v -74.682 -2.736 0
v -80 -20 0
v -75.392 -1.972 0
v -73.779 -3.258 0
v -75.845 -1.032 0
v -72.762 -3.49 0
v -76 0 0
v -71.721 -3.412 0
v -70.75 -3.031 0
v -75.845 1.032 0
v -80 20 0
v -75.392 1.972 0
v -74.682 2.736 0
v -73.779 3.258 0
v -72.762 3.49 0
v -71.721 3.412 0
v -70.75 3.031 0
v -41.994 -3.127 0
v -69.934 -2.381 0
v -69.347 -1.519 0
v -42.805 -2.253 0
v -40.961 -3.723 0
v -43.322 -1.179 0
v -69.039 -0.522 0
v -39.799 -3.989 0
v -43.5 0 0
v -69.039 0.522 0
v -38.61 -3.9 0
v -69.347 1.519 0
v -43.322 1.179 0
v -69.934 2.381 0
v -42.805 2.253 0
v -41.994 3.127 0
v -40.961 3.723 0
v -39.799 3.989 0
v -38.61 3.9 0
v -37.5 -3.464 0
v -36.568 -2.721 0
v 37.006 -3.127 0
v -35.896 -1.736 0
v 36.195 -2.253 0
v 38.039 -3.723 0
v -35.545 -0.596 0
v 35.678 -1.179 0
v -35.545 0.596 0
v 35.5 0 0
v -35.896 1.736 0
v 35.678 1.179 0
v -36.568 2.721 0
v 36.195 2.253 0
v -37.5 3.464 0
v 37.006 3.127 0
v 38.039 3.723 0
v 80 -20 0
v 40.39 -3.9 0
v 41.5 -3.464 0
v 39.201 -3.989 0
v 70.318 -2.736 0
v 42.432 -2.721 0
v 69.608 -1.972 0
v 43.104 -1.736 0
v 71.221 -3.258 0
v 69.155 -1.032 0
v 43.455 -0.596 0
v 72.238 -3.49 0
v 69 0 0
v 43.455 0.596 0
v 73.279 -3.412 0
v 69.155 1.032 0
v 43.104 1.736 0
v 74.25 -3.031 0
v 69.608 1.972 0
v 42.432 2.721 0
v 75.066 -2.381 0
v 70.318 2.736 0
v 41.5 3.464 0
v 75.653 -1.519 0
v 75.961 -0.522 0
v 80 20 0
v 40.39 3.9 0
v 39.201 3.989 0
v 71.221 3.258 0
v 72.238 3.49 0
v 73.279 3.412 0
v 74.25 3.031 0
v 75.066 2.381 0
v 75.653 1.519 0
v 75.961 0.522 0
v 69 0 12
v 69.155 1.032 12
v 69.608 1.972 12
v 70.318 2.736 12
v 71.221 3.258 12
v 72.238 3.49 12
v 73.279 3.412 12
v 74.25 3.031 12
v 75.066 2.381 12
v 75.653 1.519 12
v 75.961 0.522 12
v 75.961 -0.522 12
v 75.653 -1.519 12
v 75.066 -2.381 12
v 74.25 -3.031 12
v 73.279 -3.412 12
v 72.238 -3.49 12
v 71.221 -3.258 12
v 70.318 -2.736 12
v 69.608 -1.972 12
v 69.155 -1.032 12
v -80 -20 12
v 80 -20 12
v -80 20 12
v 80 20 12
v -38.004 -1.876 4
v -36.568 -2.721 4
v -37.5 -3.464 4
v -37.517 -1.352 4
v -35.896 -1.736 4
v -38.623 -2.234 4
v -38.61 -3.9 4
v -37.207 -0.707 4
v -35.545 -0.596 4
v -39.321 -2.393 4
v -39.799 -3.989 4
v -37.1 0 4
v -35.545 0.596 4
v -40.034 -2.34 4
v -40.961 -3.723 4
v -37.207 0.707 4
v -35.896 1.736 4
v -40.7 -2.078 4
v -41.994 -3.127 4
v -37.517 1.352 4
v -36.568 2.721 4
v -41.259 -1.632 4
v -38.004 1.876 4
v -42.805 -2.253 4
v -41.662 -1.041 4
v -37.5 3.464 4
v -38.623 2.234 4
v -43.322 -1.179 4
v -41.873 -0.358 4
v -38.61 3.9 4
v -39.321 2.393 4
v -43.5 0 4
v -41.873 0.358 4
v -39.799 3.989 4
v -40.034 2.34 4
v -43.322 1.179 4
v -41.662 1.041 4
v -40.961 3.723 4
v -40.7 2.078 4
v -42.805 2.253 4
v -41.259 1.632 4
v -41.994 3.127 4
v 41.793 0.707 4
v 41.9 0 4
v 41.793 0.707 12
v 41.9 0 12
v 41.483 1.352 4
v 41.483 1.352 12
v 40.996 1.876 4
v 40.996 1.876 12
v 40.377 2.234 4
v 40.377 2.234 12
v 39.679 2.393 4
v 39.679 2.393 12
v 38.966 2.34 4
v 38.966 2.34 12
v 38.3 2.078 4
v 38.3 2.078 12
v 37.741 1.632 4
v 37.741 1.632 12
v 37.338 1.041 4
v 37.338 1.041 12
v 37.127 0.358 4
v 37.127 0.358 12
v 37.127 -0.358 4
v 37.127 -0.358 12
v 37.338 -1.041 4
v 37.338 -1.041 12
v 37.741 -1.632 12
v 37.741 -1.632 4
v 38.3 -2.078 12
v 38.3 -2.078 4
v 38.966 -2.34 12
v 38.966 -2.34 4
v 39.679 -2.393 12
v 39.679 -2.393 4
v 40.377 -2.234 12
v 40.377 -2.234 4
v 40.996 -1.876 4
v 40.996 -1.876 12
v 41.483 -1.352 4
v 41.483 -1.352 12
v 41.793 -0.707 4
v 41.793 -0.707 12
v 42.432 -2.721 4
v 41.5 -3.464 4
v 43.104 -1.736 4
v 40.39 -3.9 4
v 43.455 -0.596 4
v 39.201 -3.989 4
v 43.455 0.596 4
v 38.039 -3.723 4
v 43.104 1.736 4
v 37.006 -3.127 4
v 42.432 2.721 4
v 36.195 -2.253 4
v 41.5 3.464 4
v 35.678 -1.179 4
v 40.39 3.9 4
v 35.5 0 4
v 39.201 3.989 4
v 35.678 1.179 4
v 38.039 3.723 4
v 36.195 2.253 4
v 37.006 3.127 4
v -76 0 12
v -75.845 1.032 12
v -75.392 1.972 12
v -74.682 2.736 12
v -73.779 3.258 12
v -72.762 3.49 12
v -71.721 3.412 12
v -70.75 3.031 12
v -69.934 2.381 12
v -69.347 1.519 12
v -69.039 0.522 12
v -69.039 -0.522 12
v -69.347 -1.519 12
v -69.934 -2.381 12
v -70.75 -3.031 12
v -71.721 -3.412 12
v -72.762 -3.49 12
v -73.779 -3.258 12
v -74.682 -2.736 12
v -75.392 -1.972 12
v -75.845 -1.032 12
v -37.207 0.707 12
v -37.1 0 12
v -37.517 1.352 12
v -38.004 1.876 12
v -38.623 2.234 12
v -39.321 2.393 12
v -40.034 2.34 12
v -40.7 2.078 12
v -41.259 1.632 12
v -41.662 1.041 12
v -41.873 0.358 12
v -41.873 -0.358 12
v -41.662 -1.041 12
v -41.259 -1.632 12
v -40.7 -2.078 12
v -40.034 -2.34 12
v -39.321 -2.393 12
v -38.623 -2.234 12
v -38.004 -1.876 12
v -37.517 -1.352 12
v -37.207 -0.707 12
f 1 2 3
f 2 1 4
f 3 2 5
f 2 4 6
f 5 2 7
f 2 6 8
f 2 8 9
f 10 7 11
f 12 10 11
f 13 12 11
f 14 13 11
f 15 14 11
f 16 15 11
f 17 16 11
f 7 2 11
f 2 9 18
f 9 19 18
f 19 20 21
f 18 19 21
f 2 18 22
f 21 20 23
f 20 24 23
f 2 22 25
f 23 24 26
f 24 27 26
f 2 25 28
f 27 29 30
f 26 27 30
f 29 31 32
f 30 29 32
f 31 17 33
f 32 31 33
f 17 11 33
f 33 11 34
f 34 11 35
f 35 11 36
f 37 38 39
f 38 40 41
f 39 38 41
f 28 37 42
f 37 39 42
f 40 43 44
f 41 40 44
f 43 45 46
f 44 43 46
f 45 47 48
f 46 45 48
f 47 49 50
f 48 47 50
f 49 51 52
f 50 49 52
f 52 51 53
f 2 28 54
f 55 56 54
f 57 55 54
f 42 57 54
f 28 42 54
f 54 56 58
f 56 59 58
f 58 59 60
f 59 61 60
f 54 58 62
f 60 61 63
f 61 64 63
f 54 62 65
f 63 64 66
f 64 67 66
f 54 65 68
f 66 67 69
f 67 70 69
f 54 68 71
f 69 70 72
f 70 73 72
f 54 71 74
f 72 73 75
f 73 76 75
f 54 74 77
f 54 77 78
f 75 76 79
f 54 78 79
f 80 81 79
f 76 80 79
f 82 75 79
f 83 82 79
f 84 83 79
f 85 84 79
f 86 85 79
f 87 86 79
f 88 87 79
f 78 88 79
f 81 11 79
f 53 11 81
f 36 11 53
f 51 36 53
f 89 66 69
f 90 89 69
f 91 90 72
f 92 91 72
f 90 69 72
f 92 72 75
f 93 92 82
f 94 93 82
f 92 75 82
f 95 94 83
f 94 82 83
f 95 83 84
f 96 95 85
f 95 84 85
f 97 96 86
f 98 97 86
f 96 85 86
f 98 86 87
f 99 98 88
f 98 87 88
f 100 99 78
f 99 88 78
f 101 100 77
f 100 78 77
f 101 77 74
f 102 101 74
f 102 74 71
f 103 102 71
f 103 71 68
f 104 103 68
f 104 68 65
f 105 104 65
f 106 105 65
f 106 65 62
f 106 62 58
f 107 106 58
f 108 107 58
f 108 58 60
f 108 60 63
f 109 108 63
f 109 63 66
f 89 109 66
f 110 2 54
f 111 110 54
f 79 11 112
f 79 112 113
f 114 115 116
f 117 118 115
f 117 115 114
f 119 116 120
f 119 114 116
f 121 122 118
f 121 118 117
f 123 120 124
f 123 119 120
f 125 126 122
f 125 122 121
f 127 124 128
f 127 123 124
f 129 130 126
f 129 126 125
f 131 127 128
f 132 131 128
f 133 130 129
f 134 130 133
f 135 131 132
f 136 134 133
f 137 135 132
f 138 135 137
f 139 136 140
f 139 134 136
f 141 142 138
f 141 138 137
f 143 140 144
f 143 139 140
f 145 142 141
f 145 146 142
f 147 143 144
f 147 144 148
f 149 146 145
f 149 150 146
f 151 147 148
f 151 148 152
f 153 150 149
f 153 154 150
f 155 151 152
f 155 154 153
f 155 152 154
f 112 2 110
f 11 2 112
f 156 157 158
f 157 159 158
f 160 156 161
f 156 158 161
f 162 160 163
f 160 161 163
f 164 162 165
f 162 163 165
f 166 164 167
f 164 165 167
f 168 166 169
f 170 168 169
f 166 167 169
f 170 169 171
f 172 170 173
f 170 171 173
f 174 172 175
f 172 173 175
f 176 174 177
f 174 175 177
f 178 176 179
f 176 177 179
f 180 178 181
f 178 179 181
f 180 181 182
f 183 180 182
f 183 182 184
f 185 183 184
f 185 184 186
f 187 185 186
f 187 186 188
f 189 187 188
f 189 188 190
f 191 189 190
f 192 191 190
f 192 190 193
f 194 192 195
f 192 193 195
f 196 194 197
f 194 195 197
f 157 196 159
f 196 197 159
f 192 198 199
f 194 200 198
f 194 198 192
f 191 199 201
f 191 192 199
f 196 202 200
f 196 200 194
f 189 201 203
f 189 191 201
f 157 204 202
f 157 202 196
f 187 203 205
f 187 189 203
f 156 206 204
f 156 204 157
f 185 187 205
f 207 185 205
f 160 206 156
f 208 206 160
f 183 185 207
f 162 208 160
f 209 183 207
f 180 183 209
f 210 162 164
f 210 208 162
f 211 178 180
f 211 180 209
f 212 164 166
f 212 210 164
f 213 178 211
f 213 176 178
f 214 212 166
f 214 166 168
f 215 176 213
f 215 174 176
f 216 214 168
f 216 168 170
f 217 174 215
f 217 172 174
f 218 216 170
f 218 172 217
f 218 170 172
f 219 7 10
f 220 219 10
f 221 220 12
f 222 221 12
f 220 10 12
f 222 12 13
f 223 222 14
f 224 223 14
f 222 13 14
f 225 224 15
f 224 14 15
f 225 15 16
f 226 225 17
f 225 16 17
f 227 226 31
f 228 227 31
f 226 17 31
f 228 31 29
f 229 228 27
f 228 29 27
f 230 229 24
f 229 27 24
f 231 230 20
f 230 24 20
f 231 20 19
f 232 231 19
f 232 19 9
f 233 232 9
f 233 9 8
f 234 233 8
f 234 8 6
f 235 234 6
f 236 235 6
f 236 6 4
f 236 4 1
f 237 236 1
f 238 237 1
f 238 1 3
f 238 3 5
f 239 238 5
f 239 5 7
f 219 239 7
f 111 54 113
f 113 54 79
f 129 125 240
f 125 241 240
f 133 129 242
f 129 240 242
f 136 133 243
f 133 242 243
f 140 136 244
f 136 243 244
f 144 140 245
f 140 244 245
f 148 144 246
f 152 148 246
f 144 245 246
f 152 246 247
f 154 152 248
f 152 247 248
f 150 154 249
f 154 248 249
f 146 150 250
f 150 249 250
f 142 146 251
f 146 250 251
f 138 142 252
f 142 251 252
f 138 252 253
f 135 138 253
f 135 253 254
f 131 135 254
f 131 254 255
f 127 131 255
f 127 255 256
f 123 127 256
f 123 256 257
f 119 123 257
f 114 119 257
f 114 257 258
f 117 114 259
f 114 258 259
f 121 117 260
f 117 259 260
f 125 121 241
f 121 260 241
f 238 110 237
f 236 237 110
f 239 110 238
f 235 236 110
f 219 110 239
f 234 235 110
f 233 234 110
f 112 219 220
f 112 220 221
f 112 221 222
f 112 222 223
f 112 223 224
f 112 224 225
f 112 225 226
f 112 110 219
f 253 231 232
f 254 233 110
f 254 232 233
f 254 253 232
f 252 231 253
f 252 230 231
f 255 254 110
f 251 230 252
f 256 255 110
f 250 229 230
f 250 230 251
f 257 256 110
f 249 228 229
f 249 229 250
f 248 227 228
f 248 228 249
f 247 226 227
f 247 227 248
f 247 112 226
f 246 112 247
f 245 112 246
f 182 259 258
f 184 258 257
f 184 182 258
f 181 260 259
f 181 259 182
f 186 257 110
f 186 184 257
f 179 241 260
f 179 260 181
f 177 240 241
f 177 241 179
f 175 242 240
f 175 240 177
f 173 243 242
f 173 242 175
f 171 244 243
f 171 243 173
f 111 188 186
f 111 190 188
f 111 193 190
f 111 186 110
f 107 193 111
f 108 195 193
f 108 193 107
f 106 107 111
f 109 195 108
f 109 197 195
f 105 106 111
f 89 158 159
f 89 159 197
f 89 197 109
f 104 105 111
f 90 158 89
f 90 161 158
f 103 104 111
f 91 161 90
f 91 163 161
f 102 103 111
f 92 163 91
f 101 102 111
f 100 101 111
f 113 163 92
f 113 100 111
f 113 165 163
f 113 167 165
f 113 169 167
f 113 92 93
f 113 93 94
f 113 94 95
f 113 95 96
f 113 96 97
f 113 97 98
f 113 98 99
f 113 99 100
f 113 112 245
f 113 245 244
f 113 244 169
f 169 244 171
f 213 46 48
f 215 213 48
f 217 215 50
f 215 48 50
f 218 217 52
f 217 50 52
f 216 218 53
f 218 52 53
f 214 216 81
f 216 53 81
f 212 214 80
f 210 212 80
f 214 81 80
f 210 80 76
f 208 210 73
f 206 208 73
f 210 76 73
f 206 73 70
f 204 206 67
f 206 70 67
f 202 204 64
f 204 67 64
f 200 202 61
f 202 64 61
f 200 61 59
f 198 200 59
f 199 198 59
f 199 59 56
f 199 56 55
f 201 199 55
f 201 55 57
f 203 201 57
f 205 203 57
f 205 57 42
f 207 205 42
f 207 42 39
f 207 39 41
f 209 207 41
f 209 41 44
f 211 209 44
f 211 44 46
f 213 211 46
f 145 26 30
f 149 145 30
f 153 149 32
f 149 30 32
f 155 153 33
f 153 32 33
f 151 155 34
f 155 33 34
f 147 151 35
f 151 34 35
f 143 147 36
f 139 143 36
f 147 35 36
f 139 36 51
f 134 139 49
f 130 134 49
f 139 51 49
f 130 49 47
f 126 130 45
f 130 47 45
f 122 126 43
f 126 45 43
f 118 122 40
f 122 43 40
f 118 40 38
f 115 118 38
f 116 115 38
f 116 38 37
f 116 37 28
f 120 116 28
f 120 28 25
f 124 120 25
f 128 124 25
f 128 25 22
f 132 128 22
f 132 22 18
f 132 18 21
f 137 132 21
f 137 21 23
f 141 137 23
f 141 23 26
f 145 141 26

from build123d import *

# Parameters (mm, degrees)
SKETCH1_W                      = 160
SKETCH1_H                      = 40
BOSS_EXTRUDE1_DEPTH            = 12
M6_CLEARANCE_HOLE1_D           = 7
CBORE_FOR_M4_SHCS1_D           = 4.8
CBORE_FOR_M4_SHCS1_CBORE_D     = 8
CBORE_FOR_M4_SHCS1_CBORE_DEPTH = 4


with BuildPart() as part:
    # Sketch1 → Boss-Extrude1 (new body)
    with BuildSketch(Plane.XY):
        Rectangle(SKETCH1_W, SKETCH1_H)
    extrude(amount=BOSS_EXTRUDE1_DEPTH)

    # M6 Clearance Hole1 (through all)
    with Locations(Plane.XY.offset(12)):
        with Locations((-72.5, 0), (72.5, 0)):
            Hole(M6_CLEARANCE_HOLE1_D / 2)

    # CBORE for M4 SHCS1 (through all)
    with Locations(Plane(origin=(0, 0, 0), x_dir=(-1, 0, 0), z_dir=(0, 0, -1))):
        with Locations((-39.5, 0), (39.5, 0)):
            CounterBoreHole(CBORE_FOR_M4_SHCS1_D / 2, CBORE_FOR_M4_SHCS1_CBORE_D / 2, CBORE_FOR_M4_SHCS1_CBORE_DEPTH)


solid = part.part
